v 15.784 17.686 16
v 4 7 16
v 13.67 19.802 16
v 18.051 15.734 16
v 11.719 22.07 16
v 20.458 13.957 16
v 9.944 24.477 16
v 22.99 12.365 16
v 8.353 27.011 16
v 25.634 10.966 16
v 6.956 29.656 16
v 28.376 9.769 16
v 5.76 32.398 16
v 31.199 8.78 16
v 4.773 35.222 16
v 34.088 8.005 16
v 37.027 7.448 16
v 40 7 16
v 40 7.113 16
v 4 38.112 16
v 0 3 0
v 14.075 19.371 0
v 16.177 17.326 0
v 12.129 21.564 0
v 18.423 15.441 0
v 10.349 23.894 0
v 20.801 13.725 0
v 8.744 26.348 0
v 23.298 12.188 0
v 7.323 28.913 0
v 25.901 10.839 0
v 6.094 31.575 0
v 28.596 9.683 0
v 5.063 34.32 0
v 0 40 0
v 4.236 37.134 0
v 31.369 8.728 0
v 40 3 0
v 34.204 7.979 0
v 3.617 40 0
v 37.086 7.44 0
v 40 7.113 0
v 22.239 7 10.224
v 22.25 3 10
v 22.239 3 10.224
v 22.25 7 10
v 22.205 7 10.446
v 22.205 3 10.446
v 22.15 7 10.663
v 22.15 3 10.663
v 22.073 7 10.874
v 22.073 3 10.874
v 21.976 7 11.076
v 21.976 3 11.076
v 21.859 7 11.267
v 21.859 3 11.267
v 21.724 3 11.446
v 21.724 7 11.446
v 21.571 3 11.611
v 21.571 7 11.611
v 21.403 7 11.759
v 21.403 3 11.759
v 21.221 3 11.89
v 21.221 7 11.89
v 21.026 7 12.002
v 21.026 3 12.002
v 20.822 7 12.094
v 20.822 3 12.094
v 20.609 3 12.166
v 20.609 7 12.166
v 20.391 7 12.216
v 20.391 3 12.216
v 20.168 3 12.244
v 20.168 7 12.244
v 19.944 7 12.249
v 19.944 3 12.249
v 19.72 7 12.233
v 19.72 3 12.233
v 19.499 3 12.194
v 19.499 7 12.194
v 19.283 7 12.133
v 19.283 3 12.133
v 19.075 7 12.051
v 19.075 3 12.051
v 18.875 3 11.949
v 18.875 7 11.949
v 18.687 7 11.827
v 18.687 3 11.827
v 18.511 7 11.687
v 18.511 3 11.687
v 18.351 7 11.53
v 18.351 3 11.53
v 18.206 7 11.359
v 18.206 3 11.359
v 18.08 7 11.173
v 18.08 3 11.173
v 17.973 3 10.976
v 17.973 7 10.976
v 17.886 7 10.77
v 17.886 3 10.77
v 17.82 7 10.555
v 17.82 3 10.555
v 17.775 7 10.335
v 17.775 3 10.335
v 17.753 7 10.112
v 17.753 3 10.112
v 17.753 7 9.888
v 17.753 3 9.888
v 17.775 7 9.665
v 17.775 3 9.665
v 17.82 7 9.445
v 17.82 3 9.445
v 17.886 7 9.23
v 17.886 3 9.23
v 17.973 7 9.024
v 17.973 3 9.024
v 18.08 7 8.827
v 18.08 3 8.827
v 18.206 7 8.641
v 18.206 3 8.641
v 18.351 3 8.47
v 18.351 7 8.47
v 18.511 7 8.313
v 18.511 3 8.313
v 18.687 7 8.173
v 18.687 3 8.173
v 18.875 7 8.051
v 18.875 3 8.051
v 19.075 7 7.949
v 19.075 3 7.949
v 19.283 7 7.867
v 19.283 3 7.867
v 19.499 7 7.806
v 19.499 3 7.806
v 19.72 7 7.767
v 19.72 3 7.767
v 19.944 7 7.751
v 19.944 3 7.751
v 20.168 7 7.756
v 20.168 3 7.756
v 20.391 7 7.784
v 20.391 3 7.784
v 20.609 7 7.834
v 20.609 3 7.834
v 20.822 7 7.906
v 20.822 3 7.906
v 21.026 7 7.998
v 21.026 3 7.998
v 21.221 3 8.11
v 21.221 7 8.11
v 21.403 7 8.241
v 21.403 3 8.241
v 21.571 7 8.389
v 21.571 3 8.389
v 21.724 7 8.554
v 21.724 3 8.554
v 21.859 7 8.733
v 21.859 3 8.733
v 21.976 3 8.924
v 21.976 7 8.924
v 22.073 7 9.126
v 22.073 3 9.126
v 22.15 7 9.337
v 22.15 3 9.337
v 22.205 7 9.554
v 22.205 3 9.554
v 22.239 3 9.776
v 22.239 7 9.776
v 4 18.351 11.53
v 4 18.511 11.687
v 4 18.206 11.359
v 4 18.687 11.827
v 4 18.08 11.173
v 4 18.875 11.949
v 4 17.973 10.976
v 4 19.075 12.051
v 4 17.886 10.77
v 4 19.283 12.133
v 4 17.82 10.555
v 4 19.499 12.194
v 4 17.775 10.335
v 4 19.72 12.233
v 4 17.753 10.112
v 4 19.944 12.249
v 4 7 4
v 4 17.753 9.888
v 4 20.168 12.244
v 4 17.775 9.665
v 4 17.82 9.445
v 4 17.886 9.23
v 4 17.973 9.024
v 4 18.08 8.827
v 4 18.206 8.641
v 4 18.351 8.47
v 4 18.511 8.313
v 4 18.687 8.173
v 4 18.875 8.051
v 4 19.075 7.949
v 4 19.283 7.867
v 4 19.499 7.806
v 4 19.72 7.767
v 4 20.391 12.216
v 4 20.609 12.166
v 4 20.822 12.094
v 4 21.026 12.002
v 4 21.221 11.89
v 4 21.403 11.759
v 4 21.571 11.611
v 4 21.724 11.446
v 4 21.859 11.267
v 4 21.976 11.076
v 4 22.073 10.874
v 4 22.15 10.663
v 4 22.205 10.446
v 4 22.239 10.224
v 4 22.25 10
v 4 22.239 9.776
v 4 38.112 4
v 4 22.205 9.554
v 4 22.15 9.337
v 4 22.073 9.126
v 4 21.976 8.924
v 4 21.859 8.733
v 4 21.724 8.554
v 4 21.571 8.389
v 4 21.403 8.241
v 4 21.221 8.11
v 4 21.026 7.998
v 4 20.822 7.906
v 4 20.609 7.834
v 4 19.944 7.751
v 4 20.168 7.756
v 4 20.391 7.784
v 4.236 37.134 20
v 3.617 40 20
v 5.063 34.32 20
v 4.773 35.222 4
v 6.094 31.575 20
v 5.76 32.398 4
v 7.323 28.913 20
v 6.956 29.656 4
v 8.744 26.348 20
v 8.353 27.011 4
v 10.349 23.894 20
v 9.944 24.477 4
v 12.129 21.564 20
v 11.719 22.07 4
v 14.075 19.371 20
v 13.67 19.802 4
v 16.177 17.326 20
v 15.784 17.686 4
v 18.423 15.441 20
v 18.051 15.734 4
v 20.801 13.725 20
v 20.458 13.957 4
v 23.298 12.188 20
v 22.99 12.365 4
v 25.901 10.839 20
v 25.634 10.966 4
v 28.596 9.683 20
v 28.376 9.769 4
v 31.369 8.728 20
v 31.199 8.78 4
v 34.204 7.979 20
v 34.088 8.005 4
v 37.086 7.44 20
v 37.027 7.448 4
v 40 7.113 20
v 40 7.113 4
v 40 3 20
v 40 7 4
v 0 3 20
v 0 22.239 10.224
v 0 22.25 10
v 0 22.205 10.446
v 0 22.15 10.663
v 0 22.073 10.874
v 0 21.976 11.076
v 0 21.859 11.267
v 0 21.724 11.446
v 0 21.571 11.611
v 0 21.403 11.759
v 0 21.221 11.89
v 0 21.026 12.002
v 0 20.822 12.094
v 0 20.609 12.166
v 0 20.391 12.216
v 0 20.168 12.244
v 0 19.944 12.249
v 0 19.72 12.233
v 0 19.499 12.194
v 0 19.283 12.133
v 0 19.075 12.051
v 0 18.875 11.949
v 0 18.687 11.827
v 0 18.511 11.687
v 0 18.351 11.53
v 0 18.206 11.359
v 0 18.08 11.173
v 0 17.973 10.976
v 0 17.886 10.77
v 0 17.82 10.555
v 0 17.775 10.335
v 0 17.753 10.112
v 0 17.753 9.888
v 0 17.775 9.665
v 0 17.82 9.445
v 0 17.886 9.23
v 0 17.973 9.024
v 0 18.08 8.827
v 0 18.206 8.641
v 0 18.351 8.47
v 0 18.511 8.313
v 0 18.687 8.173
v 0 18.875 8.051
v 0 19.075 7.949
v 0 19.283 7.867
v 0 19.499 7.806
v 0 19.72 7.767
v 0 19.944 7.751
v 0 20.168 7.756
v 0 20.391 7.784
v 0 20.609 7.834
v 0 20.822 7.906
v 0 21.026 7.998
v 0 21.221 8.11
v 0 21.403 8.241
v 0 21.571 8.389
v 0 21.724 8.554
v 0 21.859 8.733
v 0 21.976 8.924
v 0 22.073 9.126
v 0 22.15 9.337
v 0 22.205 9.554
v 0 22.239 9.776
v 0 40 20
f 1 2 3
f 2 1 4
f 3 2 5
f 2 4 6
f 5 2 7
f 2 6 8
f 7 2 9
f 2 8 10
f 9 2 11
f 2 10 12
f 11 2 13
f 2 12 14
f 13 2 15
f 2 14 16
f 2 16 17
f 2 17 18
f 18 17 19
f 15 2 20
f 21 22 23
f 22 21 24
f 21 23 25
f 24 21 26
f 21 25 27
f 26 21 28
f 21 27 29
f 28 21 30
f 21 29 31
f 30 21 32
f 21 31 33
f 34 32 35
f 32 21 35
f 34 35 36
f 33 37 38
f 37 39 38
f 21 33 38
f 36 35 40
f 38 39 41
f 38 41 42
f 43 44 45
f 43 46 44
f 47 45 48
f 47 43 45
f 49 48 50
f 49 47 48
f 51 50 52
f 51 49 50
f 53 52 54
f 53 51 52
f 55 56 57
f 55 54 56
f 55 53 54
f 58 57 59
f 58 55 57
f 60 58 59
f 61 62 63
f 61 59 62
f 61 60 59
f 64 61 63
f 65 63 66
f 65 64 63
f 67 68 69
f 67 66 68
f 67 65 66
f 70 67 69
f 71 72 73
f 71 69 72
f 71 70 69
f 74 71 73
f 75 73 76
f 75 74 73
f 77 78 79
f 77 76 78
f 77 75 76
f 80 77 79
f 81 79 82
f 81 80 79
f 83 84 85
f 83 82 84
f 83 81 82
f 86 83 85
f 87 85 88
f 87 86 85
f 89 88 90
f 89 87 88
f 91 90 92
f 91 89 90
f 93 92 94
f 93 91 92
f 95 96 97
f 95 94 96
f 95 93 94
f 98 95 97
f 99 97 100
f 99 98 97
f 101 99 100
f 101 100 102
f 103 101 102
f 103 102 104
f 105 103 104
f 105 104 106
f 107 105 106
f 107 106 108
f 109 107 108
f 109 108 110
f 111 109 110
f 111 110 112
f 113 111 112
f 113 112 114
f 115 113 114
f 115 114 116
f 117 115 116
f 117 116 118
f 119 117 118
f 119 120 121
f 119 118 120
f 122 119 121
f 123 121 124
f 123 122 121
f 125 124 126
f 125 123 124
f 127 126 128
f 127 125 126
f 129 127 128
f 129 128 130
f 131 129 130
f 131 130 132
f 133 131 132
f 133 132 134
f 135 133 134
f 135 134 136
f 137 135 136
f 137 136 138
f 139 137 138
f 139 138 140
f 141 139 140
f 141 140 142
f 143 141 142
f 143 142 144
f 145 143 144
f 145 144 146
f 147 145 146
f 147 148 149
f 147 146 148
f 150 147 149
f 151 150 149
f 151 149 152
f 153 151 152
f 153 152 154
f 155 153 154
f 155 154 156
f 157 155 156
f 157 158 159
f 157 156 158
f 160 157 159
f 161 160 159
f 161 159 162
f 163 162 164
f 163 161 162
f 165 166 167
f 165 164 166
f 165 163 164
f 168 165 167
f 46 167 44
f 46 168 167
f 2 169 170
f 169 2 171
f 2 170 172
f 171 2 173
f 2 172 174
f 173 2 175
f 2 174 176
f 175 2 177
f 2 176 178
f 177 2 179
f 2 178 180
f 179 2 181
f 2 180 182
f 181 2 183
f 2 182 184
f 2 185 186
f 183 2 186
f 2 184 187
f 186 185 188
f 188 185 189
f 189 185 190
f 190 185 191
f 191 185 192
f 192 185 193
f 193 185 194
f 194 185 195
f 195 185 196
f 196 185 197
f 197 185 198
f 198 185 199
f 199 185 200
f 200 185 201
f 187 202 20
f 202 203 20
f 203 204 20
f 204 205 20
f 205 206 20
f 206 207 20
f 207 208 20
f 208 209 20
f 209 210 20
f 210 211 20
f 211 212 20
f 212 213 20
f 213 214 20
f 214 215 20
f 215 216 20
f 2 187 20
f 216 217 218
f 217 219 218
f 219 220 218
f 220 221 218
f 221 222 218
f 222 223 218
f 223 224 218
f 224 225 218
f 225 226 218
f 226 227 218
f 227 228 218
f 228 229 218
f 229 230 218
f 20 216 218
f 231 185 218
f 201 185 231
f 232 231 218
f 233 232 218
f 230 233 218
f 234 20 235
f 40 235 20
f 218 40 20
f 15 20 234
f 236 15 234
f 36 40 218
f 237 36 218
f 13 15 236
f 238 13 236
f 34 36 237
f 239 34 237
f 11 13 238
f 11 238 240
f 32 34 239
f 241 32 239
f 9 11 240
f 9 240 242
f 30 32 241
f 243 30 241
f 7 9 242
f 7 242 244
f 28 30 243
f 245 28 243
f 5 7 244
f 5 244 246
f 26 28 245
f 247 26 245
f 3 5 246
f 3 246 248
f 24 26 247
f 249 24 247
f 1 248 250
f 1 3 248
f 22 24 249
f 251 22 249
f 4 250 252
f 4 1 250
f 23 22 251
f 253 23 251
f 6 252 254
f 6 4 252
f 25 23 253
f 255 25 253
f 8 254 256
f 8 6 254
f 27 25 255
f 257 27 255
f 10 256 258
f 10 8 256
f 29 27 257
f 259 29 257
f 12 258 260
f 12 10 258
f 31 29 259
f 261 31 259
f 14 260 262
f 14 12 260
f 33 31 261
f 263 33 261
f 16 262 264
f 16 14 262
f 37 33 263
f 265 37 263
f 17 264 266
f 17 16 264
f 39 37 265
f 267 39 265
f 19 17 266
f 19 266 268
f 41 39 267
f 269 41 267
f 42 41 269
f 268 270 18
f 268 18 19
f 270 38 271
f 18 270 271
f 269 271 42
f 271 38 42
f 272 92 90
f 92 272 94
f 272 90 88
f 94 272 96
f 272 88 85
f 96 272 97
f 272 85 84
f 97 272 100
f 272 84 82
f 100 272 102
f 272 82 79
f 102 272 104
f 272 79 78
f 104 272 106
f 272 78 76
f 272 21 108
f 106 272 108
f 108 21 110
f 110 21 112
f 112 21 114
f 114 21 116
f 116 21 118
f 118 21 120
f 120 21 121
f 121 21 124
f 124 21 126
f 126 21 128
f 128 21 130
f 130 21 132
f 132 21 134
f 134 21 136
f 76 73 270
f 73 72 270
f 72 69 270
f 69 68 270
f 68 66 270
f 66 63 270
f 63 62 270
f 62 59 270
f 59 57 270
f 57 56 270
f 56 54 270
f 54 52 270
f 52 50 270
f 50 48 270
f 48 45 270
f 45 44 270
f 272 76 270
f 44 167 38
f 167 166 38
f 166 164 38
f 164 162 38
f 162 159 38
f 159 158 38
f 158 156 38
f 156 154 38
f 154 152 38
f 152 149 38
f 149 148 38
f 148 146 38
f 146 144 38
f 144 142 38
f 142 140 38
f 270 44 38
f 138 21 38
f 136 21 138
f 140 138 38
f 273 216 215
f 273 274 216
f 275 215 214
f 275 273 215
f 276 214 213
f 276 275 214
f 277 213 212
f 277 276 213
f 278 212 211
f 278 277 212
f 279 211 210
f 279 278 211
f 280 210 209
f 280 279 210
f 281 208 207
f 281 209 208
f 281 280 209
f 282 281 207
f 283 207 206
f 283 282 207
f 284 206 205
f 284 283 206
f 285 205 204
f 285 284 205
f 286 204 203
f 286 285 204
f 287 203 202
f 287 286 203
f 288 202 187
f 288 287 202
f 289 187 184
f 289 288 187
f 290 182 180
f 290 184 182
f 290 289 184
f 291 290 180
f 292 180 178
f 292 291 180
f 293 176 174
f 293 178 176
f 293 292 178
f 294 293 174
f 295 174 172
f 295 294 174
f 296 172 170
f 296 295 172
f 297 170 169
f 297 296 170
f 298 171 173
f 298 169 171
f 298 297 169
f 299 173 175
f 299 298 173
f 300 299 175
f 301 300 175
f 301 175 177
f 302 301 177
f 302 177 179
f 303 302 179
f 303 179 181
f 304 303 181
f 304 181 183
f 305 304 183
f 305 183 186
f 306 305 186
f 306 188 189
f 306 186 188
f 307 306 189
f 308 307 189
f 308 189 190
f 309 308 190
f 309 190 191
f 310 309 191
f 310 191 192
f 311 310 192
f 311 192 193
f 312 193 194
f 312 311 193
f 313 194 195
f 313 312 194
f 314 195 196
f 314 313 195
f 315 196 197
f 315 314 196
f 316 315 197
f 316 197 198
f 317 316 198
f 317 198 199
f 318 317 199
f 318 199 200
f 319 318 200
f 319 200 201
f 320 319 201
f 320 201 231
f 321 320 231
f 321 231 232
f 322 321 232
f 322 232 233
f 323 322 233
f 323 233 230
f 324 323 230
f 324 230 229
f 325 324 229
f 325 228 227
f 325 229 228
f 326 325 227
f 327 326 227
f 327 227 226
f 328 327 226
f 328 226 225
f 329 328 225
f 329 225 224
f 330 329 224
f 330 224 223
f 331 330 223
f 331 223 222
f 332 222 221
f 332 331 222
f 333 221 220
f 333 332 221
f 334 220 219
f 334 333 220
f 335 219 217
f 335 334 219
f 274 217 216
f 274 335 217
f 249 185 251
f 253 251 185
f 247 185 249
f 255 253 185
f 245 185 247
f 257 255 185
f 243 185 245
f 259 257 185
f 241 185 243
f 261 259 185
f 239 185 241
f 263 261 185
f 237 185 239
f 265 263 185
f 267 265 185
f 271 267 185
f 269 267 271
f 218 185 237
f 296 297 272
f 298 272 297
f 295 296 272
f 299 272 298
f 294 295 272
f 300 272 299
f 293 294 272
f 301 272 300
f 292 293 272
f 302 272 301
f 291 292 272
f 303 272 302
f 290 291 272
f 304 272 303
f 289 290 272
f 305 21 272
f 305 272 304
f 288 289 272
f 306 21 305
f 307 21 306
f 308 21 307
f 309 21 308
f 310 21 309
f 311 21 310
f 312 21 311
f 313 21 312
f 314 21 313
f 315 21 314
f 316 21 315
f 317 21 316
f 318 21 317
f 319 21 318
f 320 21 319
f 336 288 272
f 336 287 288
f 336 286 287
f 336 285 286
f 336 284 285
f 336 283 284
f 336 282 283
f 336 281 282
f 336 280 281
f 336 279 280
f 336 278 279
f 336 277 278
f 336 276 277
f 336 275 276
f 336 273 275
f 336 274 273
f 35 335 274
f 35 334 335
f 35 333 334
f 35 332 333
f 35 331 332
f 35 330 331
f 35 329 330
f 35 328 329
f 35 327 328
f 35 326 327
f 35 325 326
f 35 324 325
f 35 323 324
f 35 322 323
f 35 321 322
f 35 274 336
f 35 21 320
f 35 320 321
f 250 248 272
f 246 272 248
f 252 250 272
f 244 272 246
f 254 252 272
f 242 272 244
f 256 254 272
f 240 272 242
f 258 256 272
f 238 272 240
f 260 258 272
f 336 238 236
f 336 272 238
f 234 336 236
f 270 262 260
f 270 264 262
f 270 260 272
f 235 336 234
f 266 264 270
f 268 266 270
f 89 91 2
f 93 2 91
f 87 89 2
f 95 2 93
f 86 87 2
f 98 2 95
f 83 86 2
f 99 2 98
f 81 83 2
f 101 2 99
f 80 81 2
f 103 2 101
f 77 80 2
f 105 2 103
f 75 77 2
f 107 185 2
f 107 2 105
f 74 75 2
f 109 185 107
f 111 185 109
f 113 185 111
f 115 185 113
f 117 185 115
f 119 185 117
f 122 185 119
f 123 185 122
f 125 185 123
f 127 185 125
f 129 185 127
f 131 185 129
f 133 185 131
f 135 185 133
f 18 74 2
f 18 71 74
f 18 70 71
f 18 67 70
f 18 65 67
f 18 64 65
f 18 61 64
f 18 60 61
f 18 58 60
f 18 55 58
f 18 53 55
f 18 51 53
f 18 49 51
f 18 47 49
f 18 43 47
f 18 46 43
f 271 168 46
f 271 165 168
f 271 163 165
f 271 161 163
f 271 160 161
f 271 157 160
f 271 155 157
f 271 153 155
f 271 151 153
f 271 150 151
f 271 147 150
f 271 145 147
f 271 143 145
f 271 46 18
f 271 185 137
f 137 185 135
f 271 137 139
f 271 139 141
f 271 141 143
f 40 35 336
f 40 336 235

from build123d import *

# Parameters (mm, degrees)
CYLINDER001_R     = 40
CYLINDER001_DEPTH = 20
CYLINDER002_R     = 2.25
CYLINDER002_DEPTH = 20
ARRAY002_COUNT    = 2
ARRAY002_ANGLE    = 90
BOX002_W          = 40
BOX002_H          = 37
BOX002_DEPTH      = 12
BOX001_W          = 40
BOX001_H          = 37
BOX001_DEPTH      = 20


with BuildPart() as cylinder001:
    # Cylinder001 → Cylinder001 (new body)
    with BuildSketch(Plane(origin=(43, 47, 0), x_dir=(1, 0, 0), z_dir=(0, 0, 1))):
        Circle(CYLINDER001_R)
    extrude(amount=CYLINDER001_DEPTH)


with BuildPart() as array002:
    # Cylinder002 → Cylinder002 (new body)
    with BuildSketch(Plane(origin=(20, 10, 10), x_dir=(1, 0, 0), z_dir=(0, -1, 0))):
        Circle(CYLINDER002_R)
    extrude(amount=CYLINDER002_DEPTH)

    # Array002: Array002 ×2 about axis
    array002_axis = Axis((0, 0, 0), (0, 0, 1))


with BuildPart() as array002_1:
    add(array002.part)
    for i in range(1, ARRAY002_COUNT):
        add(array002.part.rotate(array002_axis, i * ARRAY002_ANGLE / (ARRAY002_COUNT - 1)))


with BuildPart() as fusion:
    # Box002 → Box002 (new body)
    with BuildSketch(Plane(origin=(4, 7, 4), x_dir=(1, 0, 0), z_dir=(0, 0, 1))):
        with Locations((20, 18.5)):
            Rectangle(BOX002_W, BOX002_H)
    extrude(amount=BOX002_DEPTH)

    # Fusion: union Cylinder001, Array002
    add(cylinder001.part)
    add(array002_1.part)


with BuildPart() as cut001:
    # Box001 → Box001 (new body)
    with BuildSketch(Plane(origin=(0, 3, 0), x_dir=(1, 0, 0), z_dir=(0, 0, 1))):
        with Locations((20, 18.5)):
            Rectangle(BOX001_W, BOX001_H)
    extrude(amount=BOX001_DEPTH)

    # Cut001: cut Fusion
    add(fusion.part, mode=Mode.SUBTRACT)


solid = cut001.part
